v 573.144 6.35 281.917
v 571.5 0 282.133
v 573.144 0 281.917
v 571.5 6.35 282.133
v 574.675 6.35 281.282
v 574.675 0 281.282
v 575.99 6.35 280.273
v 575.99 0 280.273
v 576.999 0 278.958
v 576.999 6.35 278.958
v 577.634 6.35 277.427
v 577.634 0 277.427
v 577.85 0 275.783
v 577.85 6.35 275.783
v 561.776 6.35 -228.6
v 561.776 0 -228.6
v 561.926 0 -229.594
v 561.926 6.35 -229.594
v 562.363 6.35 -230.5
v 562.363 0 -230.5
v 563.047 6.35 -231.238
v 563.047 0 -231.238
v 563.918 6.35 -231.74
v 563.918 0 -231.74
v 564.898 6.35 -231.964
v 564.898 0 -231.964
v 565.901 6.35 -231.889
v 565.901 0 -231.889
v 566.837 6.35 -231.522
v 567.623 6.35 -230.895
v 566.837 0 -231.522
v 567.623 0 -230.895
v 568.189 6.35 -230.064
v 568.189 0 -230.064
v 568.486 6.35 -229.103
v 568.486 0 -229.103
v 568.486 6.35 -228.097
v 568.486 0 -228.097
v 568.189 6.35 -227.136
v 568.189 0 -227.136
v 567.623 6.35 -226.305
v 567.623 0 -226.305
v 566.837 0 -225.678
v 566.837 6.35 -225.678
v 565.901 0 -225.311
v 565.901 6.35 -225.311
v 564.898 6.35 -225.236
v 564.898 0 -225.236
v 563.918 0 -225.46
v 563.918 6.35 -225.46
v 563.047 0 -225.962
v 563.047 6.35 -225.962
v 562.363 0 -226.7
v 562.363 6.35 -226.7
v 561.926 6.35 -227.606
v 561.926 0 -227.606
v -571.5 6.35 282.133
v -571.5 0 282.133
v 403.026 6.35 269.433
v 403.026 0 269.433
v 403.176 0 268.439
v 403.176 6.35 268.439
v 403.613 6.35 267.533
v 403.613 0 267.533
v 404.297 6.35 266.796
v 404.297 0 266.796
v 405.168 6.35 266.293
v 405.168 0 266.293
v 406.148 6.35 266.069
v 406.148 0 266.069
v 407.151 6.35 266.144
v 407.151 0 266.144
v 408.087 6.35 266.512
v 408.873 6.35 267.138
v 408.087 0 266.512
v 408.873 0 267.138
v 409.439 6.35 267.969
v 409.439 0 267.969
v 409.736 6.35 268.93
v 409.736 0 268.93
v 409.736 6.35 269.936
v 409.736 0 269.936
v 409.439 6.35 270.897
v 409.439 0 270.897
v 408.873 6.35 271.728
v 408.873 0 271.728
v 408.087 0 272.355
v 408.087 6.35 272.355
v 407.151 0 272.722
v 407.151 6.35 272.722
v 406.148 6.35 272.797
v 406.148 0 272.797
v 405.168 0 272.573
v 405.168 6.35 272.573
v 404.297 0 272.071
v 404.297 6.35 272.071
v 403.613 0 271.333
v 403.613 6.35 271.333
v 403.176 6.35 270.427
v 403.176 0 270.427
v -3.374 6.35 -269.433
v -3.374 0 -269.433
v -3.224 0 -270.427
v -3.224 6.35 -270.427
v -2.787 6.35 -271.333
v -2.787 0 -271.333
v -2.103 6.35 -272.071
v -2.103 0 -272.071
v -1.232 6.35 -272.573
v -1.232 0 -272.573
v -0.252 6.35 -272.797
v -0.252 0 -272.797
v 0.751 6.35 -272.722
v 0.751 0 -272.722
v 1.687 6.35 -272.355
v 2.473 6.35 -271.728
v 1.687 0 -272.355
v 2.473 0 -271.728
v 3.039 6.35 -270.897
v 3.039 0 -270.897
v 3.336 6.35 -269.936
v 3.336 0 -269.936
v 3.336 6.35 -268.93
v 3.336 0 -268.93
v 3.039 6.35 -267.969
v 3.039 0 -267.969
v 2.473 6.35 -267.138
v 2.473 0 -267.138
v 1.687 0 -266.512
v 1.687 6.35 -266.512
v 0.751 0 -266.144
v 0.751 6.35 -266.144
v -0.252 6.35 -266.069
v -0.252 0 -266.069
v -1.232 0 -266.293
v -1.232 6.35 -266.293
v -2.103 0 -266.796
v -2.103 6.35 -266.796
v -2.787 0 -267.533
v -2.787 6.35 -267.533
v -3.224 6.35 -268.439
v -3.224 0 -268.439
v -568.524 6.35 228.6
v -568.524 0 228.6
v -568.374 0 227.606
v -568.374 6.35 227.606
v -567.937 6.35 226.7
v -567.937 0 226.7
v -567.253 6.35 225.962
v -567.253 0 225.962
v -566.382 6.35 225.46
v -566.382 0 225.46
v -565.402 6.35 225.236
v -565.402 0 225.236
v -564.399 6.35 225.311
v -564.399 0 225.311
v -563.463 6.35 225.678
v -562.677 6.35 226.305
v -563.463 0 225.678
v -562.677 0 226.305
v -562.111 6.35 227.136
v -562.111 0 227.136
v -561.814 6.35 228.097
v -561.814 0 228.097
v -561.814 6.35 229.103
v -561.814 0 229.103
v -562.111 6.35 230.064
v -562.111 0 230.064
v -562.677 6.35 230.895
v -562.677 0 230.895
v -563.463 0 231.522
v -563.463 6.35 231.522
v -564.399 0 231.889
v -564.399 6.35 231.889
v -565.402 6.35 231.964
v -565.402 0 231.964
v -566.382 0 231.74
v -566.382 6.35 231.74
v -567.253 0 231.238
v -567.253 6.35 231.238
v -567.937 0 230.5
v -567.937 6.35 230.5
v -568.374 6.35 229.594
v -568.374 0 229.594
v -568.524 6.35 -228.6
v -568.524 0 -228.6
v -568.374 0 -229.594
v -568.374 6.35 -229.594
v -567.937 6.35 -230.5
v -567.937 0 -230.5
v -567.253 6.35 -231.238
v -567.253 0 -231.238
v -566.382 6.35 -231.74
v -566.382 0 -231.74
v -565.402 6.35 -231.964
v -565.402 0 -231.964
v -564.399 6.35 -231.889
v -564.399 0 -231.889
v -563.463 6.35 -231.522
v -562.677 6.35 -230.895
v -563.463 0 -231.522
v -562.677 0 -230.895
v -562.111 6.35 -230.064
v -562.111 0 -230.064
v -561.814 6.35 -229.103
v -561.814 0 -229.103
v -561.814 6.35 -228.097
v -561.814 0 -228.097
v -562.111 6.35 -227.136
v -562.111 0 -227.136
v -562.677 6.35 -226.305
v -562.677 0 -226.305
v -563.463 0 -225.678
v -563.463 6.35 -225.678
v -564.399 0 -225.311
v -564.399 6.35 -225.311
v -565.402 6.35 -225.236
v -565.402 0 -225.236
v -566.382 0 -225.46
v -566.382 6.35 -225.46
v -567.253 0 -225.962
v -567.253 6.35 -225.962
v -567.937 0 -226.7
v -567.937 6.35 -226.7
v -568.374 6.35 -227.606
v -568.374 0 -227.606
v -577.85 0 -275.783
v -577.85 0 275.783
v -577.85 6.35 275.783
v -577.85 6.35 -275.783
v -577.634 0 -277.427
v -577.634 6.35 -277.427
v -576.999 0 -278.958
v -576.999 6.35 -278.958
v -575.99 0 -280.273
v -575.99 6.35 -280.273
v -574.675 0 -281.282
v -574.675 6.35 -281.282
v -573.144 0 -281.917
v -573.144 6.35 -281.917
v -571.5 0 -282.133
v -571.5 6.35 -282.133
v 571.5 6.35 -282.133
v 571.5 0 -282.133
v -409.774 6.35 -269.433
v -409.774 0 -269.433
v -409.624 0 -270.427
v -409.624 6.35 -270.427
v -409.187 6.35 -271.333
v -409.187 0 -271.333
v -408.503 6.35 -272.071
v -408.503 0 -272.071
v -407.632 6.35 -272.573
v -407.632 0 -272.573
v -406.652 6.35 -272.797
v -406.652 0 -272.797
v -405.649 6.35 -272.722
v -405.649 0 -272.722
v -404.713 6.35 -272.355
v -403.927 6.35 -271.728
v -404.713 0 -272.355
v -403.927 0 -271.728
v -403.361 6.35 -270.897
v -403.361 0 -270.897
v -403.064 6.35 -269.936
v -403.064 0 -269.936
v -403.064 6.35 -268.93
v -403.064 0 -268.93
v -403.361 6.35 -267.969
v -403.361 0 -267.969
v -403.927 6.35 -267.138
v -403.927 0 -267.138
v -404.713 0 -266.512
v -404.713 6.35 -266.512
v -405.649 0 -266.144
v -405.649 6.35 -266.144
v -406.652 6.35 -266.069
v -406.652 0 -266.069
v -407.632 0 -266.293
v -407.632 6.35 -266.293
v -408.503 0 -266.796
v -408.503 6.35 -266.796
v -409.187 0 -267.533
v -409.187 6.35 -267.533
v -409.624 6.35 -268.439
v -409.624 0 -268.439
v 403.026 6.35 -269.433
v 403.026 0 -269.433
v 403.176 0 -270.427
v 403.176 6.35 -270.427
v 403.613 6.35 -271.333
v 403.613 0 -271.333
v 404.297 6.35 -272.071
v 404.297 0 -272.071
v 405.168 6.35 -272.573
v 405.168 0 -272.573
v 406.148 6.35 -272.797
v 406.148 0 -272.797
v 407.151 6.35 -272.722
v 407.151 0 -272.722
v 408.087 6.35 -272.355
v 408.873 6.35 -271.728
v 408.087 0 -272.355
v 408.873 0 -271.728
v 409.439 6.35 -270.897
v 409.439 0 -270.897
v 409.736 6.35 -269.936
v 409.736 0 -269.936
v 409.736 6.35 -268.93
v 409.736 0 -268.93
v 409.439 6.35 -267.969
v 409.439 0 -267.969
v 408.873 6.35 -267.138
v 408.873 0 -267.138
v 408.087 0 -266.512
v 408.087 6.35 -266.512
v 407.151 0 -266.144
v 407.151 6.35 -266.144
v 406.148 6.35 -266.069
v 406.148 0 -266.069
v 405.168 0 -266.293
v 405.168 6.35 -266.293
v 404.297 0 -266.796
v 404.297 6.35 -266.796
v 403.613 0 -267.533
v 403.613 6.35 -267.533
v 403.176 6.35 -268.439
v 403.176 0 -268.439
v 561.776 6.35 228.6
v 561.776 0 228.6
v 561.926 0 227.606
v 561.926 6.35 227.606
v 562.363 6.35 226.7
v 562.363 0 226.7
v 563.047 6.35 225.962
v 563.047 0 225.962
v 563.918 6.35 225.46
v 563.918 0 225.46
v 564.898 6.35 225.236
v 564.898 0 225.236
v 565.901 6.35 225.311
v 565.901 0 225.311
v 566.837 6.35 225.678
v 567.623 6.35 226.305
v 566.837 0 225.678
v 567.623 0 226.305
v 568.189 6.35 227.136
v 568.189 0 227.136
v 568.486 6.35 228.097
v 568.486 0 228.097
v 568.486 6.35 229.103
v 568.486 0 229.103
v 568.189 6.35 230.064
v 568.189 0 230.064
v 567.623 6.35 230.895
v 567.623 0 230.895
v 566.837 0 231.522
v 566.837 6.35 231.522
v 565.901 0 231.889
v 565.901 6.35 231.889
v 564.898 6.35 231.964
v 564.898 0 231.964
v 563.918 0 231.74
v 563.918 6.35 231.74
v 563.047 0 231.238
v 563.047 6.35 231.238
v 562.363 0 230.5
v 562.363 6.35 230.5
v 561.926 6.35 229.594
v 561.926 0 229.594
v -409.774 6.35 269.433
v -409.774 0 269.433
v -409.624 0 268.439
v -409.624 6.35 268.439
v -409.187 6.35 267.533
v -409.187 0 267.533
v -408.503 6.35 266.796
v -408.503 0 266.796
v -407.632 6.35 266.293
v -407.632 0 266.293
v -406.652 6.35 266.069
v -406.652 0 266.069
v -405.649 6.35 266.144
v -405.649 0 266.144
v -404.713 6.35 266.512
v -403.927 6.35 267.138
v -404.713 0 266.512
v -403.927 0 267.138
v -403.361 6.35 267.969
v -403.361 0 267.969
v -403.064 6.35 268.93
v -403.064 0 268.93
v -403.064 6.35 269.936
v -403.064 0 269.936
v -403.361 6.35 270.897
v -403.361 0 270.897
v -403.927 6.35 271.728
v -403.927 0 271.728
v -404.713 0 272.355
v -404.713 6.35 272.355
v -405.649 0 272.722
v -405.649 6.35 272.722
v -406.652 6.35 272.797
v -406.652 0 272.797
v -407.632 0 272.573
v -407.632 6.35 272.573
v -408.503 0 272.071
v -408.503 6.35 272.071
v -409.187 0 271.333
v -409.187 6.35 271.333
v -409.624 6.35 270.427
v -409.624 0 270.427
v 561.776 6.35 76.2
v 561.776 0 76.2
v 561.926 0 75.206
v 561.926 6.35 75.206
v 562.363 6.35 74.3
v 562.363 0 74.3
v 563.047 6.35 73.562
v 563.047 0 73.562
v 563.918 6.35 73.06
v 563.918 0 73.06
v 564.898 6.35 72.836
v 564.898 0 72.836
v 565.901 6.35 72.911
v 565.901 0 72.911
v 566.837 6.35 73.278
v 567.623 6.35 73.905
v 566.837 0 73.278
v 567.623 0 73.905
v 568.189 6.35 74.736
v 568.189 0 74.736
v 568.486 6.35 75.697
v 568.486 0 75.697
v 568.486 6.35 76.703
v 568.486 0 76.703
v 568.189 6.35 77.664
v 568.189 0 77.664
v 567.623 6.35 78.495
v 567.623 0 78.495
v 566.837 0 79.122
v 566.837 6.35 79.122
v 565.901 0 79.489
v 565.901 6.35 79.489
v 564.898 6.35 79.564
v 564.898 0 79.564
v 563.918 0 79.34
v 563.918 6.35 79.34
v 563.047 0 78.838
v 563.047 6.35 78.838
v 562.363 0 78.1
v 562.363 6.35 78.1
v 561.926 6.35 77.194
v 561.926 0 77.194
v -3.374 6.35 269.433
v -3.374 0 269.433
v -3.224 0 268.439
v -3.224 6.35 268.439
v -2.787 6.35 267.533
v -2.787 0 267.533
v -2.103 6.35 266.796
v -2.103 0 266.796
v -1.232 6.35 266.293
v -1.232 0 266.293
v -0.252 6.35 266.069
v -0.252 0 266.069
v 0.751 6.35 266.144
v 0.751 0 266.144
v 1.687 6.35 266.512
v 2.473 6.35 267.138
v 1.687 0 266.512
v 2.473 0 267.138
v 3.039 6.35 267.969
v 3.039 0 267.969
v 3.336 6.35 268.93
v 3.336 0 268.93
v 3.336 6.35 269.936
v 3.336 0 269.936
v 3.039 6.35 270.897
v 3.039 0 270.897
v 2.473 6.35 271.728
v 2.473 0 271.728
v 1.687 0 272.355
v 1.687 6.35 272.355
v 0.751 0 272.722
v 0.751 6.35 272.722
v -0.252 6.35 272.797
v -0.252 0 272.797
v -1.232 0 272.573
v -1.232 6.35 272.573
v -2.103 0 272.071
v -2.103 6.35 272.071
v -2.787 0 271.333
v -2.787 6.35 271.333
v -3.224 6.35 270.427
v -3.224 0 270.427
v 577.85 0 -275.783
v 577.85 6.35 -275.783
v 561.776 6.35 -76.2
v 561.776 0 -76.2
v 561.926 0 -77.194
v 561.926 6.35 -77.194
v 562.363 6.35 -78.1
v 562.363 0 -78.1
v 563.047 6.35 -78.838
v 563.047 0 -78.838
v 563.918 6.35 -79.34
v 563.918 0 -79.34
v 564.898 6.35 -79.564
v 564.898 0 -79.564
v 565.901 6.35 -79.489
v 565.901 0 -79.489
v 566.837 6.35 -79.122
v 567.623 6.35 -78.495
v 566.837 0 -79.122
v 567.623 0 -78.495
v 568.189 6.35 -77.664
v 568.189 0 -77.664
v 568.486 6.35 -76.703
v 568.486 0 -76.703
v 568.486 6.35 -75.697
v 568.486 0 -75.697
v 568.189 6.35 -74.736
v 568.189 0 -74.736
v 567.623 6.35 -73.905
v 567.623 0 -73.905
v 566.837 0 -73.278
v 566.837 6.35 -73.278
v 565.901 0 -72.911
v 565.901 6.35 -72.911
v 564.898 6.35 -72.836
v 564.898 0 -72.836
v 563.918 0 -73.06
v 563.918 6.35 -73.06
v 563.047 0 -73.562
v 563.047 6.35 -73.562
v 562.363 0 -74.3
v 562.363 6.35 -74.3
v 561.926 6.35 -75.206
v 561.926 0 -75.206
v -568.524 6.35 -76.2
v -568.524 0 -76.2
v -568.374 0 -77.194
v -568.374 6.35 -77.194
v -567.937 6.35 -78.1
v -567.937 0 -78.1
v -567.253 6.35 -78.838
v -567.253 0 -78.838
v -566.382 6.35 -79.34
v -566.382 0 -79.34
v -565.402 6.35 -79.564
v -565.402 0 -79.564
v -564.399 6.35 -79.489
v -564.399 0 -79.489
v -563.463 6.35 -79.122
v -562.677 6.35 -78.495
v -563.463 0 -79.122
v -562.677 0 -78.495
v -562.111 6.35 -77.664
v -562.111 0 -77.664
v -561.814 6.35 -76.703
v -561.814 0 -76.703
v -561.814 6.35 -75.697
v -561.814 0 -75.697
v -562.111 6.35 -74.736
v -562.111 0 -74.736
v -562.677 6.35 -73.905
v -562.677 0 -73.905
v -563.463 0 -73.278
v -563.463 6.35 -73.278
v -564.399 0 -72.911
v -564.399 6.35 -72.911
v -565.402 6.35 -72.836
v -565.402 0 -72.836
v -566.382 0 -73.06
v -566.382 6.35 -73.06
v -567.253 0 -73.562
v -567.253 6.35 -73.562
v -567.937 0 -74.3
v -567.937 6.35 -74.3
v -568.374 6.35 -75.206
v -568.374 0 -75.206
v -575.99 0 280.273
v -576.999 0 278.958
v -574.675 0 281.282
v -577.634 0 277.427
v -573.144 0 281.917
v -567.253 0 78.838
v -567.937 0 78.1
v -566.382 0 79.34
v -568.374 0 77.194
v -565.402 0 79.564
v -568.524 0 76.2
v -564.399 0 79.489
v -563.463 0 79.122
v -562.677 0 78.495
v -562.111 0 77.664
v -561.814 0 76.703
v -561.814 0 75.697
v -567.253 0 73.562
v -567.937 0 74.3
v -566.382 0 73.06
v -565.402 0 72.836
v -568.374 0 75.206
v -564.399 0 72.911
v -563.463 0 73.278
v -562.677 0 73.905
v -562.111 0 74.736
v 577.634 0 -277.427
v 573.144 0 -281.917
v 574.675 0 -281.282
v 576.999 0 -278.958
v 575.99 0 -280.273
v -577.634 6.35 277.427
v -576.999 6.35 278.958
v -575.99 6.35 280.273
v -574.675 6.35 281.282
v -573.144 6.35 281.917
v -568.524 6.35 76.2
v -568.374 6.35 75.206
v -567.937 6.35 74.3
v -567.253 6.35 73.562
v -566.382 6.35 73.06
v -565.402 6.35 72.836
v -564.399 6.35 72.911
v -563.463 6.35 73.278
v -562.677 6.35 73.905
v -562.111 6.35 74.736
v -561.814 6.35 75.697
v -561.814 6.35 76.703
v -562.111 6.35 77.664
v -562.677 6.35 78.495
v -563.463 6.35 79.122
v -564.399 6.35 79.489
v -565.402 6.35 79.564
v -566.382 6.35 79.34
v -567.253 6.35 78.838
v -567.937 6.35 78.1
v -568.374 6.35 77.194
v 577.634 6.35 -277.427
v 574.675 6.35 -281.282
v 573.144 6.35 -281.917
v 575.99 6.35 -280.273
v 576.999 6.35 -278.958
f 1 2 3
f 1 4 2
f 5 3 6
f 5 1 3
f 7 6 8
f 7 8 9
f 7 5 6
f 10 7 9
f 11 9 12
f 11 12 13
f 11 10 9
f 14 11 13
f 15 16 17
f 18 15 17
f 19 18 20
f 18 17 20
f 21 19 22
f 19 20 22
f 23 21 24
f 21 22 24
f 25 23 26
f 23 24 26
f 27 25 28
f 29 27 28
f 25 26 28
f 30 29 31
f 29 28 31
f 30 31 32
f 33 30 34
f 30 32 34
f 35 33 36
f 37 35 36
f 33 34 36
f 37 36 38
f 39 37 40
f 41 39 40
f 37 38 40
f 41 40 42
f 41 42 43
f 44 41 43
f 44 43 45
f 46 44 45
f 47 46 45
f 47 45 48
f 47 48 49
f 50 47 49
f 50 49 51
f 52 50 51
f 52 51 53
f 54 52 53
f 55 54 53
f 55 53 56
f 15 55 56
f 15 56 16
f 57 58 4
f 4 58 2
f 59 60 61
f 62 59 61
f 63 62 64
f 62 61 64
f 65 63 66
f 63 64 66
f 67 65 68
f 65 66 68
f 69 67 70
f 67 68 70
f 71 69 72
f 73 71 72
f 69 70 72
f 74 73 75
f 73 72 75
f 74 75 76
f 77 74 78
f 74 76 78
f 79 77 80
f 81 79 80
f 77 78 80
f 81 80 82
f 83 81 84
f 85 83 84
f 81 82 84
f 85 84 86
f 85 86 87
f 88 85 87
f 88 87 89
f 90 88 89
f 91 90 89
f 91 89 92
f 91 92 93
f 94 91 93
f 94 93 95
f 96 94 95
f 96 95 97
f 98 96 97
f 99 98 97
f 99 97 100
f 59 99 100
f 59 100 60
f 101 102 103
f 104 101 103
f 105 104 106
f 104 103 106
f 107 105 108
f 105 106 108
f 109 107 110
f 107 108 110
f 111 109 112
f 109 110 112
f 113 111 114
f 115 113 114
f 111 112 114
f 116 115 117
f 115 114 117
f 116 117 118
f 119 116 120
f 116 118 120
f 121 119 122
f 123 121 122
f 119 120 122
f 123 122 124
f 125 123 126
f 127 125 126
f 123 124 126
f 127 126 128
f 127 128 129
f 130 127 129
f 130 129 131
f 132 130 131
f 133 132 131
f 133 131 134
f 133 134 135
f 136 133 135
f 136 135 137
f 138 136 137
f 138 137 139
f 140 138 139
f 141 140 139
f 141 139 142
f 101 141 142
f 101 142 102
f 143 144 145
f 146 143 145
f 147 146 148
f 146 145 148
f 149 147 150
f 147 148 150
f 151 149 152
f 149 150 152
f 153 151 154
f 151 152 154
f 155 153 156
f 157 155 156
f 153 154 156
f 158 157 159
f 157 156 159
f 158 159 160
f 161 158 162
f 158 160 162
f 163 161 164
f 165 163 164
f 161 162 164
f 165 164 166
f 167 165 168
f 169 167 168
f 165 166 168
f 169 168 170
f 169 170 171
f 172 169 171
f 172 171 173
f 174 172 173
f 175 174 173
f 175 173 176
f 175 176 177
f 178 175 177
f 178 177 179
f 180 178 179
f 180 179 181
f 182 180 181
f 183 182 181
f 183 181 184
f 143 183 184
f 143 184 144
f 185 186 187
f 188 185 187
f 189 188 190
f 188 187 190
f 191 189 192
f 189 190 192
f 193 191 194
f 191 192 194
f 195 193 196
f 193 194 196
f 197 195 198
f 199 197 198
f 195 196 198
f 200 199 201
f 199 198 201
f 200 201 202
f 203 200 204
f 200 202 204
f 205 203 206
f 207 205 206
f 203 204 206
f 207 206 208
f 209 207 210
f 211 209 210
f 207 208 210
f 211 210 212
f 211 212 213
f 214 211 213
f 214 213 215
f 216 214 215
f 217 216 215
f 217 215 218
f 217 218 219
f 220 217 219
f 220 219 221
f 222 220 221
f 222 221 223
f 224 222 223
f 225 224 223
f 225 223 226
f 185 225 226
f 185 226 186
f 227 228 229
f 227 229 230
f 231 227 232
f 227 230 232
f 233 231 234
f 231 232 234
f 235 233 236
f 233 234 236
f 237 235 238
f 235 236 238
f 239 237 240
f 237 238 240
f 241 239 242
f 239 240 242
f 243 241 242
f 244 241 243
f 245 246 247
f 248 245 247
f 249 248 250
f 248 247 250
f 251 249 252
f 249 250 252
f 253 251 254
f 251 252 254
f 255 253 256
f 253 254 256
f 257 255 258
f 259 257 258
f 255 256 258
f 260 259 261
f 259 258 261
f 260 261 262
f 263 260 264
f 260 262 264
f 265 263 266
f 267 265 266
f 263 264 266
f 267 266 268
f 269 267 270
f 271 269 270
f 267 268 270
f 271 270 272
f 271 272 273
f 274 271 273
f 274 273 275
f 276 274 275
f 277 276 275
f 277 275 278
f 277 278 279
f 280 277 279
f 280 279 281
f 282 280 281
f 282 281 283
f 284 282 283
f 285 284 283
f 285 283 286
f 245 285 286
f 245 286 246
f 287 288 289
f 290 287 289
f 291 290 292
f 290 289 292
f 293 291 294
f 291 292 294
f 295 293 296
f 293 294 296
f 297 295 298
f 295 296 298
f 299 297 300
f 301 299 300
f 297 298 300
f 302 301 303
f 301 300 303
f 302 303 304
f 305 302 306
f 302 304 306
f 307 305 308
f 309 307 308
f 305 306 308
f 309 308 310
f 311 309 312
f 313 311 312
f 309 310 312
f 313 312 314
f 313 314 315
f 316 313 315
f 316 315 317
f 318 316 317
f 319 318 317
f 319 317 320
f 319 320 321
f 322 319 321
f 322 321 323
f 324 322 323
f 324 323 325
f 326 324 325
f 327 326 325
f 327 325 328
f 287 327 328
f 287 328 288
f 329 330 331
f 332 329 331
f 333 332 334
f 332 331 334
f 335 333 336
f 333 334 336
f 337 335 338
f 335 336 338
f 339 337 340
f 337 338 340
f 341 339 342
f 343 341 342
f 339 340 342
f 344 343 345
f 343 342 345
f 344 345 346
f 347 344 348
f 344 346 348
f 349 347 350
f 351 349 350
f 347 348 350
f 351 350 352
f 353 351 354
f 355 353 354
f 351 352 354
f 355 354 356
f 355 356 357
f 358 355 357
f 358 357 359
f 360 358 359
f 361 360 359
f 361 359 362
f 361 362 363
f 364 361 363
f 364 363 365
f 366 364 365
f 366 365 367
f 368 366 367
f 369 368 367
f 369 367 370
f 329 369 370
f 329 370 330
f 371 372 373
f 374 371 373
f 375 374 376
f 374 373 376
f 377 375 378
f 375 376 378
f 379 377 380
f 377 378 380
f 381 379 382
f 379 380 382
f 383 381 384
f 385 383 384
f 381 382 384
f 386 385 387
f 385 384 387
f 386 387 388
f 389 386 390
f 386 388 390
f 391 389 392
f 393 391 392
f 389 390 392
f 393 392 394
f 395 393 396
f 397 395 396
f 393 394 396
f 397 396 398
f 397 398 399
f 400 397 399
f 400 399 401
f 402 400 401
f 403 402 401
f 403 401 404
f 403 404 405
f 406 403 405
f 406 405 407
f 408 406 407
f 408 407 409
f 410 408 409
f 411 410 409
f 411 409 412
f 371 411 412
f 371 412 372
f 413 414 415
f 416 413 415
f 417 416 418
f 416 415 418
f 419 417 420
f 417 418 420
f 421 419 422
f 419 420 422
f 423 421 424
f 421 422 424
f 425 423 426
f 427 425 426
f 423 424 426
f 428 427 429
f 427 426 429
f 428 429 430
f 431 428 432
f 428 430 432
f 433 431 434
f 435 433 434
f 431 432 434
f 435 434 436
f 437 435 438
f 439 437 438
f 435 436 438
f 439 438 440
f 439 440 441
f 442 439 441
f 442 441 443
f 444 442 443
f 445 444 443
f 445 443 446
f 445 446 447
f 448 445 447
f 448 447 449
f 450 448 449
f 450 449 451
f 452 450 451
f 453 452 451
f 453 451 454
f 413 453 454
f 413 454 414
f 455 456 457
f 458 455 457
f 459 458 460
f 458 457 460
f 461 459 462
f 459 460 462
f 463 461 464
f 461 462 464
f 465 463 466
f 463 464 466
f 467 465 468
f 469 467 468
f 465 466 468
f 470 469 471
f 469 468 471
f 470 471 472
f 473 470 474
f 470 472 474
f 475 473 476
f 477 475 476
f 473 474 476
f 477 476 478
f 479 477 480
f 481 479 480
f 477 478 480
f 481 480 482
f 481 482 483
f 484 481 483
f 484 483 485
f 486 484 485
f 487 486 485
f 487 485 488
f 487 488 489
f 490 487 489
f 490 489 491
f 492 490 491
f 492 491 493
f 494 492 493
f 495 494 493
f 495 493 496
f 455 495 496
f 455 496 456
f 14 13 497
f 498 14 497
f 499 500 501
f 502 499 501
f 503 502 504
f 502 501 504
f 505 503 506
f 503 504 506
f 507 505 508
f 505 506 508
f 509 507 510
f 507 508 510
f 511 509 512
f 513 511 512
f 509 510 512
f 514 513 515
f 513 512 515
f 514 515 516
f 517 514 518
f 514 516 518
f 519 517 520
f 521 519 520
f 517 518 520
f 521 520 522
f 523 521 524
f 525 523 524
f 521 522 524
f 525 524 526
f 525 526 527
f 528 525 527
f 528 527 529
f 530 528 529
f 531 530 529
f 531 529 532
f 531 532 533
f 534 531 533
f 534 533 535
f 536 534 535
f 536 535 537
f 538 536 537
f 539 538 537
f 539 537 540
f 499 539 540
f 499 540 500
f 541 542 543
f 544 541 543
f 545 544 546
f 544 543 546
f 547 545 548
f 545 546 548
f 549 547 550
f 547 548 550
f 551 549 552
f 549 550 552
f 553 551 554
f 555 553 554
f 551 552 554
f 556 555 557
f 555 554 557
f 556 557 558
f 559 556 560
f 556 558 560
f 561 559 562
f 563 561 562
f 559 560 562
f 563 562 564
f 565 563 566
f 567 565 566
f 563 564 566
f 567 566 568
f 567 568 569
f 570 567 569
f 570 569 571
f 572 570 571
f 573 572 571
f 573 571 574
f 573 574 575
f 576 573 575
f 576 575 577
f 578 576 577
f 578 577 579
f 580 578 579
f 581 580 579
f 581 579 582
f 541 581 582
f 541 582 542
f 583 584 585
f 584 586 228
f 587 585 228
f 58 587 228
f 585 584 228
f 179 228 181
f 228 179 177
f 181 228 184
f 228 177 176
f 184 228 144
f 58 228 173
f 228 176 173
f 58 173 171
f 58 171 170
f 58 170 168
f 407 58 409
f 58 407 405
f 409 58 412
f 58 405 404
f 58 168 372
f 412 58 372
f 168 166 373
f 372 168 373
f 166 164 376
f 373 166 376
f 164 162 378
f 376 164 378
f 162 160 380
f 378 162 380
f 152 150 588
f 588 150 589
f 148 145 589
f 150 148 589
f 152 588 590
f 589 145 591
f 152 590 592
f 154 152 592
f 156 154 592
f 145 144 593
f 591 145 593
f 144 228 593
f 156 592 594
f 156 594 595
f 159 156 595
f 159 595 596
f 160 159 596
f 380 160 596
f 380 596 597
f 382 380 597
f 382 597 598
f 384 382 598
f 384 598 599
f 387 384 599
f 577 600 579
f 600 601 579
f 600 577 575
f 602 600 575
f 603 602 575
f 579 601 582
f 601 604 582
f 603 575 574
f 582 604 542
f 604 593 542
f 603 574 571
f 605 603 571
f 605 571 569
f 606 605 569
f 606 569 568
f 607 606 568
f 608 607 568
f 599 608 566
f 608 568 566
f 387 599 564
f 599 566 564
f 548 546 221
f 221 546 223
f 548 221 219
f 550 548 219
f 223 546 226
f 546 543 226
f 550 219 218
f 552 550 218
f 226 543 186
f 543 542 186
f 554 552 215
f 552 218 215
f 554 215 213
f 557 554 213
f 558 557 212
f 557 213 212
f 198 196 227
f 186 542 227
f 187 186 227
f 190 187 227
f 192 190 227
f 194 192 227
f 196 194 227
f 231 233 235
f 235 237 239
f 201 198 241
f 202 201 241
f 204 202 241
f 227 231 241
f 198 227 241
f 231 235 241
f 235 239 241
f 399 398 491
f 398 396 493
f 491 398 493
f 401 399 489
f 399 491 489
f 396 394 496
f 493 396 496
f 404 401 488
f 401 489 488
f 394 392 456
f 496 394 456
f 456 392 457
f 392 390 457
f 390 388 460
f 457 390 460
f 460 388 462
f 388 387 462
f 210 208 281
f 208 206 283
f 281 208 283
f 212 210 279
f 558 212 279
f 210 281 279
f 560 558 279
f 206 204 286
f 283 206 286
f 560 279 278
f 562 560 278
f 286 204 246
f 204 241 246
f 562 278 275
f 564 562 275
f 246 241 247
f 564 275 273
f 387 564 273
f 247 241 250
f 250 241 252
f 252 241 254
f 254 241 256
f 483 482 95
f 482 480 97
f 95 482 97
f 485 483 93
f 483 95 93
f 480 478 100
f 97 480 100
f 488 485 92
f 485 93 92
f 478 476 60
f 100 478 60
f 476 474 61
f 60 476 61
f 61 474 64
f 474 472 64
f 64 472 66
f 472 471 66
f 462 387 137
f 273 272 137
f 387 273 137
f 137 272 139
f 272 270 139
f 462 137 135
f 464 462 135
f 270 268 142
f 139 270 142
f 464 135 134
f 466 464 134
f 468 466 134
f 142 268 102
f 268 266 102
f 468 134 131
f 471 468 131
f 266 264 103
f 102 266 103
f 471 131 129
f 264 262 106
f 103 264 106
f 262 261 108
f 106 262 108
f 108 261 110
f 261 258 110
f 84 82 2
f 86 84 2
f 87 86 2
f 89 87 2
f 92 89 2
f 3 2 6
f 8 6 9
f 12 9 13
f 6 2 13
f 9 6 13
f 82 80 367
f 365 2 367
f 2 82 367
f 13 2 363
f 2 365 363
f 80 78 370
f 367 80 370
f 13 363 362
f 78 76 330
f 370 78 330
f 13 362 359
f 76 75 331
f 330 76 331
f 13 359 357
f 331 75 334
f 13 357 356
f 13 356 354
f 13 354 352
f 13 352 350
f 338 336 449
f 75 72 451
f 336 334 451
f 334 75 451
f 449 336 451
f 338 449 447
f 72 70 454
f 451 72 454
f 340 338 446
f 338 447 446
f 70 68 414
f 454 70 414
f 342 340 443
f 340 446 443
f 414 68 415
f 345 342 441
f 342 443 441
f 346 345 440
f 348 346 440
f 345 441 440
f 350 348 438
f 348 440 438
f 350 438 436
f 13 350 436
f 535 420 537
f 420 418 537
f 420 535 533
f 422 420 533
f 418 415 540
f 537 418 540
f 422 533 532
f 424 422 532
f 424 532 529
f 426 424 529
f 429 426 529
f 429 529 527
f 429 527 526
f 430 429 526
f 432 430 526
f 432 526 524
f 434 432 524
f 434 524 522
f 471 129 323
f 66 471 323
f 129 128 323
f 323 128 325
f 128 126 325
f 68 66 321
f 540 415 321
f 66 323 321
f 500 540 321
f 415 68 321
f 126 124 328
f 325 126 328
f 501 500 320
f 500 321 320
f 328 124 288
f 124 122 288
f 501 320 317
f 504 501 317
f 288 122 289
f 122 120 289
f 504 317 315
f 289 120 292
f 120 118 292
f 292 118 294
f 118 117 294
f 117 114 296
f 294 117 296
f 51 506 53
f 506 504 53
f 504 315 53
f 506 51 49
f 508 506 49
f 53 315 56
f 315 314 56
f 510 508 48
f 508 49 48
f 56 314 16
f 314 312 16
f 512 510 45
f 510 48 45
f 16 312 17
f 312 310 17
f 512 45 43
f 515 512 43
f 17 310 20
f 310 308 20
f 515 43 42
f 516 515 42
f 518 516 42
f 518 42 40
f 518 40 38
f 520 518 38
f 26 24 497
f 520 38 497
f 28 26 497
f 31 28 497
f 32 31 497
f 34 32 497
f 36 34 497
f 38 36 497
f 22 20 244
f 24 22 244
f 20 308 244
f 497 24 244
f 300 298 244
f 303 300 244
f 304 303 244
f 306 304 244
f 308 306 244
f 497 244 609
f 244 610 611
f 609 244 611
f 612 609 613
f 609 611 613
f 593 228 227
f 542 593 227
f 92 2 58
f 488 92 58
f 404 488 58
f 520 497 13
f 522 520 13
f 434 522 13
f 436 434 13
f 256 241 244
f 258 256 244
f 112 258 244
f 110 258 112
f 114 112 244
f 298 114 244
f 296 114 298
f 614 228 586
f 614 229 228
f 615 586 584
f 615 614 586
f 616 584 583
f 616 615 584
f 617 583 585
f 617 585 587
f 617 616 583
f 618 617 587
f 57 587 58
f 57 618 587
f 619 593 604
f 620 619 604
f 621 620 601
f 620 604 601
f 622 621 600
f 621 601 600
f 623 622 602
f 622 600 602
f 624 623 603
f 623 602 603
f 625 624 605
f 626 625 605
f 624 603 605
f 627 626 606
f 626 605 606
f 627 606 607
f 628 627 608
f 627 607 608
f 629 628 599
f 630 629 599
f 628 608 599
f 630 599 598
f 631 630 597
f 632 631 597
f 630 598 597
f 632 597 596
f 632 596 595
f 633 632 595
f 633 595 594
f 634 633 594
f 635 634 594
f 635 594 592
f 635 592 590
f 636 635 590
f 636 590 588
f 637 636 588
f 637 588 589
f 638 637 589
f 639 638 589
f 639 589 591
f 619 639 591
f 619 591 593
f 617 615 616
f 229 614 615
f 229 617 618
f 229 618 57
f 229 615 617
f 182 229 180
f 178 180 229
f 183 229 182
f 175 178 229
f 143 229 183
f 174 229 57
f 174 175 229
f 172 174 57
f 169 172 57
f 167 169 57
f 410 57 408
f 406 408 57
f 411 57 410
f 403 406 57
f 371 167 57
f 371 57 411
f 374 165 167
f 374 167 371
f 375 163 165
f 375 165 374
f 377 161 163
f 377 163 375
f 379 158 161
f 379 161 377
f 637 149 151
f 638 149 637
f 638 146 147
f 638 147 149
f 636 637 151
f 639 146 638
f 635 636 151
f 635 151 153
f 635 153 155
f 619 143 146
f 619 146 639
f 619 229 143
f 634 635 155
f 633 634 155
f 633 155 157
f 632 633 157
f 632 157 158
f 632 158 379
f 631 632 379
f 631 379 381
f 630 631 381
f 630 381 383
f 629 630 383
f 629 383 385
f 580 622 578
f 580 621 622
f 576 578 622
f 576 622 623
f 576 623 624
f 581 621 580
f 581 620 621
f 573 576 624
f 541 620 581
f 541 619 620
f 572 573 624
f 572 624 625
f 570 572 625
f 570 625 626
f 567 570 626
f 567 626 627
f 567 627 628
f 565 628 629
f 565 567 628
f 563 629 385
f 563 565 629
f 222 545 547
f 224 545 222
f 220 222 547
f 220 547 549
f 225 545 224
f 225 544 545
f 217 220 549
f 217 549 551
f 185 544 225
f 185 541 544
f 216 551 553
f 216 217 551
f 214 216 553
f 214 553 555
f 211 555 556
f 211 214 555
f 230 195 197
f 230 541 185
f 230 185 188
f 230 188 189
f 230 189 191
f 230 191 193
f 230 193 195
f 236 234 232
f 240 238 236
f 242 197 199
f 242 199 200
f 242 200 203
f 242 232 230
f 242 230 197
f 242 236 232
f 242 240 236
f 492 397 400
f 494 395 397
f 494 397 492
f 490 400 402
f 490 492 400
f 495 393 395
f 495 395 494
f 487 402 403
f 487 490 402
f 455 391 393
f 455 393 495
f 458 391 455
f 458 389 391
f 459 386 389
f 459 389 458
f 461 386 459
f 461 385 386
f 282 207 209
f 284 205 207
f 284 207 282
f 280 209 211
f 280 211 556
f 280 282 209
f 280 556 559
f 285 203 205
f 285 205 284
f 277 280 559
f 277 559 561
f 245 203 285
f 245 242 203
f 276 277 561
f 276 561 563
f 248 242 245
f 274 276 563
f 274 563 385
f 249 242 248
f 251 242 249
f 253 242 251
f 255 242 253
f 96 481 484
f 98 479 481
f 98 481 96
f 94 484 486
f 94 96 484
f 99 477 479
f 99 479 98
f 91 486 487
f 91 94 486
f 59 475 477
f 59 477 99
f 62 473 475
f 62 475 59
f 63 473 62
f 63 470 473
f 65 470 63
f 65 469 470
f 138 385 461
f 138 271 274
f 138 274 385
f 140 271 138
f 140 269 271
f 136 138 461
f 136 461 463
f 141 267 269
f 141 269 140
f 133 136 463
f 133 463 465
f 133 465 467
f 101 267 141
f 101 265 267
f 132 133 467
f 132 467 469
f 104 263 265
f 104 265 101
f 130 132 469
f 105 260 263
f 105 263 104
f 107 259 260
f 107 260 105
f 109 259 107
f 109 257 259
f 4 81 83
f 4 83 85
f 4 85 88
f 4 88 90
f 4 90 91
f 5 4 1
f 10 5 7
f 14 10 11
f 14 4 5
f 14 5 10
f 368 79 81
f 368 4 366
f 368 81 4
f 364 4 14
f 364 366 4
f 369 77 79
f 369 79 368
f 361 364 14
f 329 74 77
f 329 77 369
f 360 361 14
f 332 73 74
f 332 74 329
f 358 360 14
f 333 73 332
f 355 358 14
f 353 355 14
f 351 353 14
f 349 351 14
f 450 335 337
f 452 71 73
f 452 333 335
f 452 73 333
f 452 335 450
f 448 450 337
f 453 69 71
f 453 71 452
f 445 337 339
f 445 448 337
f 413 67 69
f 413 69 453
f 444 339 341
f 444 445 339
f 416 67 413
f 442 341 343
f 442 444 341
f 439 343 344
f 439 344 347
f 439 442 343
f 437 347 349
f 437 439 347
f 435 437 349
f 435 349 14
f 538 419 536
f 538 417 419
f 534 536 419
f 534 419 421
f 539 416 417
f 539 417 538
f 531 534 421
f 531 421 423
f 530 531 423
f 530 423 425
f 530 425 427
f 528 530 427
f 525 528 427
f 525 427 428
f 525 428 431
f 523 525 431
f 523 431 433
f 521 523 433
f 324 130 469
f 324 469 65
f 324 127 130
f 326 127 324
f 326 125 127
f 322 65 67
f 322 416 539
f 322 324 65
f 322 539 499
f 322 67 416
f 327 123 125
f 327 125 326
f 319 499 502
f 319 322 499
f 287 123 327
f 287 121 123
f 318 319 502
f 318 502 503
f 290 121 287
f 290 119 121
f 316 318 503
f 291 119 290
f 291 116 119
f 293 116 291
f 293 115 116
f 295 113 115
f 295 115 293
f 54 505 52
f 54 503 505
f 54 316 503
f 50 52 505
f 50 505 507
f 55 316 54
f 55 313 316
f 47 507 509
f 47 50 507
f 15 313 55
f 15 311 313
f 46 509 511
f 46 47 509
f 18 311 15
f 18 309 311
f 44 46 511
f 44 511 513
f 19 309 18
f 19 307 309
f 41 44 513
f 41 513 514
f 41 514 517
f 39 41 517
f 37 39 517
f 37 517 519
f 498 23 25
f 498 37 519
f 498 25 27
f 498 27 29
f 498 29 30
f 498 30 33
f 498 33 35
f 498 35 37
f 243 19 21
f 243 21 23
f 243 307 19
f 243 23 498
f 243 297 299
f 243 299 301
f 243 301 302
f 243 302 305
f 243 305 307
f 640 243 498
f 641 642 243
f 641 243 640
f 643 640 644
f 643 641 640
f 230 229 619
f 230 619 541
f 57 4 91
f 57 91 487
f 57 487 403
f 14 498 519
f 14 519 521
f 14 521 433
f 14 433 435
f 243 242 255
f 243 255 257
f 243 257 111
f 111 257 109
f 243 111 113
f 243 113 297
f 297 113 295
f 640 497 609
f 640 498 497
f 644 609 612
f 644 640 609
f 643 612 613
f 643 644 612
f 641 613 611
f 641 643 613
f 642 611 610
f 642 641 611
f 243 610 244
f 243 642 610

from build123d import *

# Parameters (mm, degrees)
SKETCH1_W                        = 1155.7
SKETCH1_H                        = 564.26608
BOSS_EXTRUDE1_DEPTH              = 6.35
FILLET1_R                        = 6.35
F_17_64_0_26563_DIAMETER_HOLE1_D = 6.747002


with BuildPart() as part:
    # Sketch1 → Boss-Extrude1 (new body)
    with BuildSketch(Plane(origin=(0, 0, 0), x_dir=(1, 0, 0), z_dir=(0, 1, 0))):
        Rectangle(SKETCH1_W, SKETCH1_H)
    extrude(amount=BOSS_EXTRUDE1_DEPTH)

    # Fillet1
    fillet1_edges = [part.edges().sort_by_distance(p)[0] for p in [
        (577.85, 3.175, 282.13304),
        (-577.85, 3.175, 282.13304),
        (-577.85, 3.175, -282.13304),
        (577.85, 3.175, -282.13304),
    ]]
    fillet(fillet1_edges, radius=FILLET1_R)

    # 17/64 (0.26563) Diameter Hole1 (through all)
    with Locations(Plane(origin=(0, 6.35, 0), x_dir=(1, 0, 0), z_dir=(0, 1, 0))):
        with Locations((-565.15, 228.6), (-565.15, 76.2), (-565.15, -76.2), (-565.15, -228.6), (565.15, 228.6), (565.15, 76.2), (565.15, -76.2), (565.15, -228.6), (-406.4, 269.43304), (0, 269.43304), (406.4, 269.43304), (406.4, -269.43304), (0, -269.43304), (-406.4, -269.43304)):
            Hole(F_17_64_0_26563_DIAMETER_HOLE1_D / 2)


solid = part.part
